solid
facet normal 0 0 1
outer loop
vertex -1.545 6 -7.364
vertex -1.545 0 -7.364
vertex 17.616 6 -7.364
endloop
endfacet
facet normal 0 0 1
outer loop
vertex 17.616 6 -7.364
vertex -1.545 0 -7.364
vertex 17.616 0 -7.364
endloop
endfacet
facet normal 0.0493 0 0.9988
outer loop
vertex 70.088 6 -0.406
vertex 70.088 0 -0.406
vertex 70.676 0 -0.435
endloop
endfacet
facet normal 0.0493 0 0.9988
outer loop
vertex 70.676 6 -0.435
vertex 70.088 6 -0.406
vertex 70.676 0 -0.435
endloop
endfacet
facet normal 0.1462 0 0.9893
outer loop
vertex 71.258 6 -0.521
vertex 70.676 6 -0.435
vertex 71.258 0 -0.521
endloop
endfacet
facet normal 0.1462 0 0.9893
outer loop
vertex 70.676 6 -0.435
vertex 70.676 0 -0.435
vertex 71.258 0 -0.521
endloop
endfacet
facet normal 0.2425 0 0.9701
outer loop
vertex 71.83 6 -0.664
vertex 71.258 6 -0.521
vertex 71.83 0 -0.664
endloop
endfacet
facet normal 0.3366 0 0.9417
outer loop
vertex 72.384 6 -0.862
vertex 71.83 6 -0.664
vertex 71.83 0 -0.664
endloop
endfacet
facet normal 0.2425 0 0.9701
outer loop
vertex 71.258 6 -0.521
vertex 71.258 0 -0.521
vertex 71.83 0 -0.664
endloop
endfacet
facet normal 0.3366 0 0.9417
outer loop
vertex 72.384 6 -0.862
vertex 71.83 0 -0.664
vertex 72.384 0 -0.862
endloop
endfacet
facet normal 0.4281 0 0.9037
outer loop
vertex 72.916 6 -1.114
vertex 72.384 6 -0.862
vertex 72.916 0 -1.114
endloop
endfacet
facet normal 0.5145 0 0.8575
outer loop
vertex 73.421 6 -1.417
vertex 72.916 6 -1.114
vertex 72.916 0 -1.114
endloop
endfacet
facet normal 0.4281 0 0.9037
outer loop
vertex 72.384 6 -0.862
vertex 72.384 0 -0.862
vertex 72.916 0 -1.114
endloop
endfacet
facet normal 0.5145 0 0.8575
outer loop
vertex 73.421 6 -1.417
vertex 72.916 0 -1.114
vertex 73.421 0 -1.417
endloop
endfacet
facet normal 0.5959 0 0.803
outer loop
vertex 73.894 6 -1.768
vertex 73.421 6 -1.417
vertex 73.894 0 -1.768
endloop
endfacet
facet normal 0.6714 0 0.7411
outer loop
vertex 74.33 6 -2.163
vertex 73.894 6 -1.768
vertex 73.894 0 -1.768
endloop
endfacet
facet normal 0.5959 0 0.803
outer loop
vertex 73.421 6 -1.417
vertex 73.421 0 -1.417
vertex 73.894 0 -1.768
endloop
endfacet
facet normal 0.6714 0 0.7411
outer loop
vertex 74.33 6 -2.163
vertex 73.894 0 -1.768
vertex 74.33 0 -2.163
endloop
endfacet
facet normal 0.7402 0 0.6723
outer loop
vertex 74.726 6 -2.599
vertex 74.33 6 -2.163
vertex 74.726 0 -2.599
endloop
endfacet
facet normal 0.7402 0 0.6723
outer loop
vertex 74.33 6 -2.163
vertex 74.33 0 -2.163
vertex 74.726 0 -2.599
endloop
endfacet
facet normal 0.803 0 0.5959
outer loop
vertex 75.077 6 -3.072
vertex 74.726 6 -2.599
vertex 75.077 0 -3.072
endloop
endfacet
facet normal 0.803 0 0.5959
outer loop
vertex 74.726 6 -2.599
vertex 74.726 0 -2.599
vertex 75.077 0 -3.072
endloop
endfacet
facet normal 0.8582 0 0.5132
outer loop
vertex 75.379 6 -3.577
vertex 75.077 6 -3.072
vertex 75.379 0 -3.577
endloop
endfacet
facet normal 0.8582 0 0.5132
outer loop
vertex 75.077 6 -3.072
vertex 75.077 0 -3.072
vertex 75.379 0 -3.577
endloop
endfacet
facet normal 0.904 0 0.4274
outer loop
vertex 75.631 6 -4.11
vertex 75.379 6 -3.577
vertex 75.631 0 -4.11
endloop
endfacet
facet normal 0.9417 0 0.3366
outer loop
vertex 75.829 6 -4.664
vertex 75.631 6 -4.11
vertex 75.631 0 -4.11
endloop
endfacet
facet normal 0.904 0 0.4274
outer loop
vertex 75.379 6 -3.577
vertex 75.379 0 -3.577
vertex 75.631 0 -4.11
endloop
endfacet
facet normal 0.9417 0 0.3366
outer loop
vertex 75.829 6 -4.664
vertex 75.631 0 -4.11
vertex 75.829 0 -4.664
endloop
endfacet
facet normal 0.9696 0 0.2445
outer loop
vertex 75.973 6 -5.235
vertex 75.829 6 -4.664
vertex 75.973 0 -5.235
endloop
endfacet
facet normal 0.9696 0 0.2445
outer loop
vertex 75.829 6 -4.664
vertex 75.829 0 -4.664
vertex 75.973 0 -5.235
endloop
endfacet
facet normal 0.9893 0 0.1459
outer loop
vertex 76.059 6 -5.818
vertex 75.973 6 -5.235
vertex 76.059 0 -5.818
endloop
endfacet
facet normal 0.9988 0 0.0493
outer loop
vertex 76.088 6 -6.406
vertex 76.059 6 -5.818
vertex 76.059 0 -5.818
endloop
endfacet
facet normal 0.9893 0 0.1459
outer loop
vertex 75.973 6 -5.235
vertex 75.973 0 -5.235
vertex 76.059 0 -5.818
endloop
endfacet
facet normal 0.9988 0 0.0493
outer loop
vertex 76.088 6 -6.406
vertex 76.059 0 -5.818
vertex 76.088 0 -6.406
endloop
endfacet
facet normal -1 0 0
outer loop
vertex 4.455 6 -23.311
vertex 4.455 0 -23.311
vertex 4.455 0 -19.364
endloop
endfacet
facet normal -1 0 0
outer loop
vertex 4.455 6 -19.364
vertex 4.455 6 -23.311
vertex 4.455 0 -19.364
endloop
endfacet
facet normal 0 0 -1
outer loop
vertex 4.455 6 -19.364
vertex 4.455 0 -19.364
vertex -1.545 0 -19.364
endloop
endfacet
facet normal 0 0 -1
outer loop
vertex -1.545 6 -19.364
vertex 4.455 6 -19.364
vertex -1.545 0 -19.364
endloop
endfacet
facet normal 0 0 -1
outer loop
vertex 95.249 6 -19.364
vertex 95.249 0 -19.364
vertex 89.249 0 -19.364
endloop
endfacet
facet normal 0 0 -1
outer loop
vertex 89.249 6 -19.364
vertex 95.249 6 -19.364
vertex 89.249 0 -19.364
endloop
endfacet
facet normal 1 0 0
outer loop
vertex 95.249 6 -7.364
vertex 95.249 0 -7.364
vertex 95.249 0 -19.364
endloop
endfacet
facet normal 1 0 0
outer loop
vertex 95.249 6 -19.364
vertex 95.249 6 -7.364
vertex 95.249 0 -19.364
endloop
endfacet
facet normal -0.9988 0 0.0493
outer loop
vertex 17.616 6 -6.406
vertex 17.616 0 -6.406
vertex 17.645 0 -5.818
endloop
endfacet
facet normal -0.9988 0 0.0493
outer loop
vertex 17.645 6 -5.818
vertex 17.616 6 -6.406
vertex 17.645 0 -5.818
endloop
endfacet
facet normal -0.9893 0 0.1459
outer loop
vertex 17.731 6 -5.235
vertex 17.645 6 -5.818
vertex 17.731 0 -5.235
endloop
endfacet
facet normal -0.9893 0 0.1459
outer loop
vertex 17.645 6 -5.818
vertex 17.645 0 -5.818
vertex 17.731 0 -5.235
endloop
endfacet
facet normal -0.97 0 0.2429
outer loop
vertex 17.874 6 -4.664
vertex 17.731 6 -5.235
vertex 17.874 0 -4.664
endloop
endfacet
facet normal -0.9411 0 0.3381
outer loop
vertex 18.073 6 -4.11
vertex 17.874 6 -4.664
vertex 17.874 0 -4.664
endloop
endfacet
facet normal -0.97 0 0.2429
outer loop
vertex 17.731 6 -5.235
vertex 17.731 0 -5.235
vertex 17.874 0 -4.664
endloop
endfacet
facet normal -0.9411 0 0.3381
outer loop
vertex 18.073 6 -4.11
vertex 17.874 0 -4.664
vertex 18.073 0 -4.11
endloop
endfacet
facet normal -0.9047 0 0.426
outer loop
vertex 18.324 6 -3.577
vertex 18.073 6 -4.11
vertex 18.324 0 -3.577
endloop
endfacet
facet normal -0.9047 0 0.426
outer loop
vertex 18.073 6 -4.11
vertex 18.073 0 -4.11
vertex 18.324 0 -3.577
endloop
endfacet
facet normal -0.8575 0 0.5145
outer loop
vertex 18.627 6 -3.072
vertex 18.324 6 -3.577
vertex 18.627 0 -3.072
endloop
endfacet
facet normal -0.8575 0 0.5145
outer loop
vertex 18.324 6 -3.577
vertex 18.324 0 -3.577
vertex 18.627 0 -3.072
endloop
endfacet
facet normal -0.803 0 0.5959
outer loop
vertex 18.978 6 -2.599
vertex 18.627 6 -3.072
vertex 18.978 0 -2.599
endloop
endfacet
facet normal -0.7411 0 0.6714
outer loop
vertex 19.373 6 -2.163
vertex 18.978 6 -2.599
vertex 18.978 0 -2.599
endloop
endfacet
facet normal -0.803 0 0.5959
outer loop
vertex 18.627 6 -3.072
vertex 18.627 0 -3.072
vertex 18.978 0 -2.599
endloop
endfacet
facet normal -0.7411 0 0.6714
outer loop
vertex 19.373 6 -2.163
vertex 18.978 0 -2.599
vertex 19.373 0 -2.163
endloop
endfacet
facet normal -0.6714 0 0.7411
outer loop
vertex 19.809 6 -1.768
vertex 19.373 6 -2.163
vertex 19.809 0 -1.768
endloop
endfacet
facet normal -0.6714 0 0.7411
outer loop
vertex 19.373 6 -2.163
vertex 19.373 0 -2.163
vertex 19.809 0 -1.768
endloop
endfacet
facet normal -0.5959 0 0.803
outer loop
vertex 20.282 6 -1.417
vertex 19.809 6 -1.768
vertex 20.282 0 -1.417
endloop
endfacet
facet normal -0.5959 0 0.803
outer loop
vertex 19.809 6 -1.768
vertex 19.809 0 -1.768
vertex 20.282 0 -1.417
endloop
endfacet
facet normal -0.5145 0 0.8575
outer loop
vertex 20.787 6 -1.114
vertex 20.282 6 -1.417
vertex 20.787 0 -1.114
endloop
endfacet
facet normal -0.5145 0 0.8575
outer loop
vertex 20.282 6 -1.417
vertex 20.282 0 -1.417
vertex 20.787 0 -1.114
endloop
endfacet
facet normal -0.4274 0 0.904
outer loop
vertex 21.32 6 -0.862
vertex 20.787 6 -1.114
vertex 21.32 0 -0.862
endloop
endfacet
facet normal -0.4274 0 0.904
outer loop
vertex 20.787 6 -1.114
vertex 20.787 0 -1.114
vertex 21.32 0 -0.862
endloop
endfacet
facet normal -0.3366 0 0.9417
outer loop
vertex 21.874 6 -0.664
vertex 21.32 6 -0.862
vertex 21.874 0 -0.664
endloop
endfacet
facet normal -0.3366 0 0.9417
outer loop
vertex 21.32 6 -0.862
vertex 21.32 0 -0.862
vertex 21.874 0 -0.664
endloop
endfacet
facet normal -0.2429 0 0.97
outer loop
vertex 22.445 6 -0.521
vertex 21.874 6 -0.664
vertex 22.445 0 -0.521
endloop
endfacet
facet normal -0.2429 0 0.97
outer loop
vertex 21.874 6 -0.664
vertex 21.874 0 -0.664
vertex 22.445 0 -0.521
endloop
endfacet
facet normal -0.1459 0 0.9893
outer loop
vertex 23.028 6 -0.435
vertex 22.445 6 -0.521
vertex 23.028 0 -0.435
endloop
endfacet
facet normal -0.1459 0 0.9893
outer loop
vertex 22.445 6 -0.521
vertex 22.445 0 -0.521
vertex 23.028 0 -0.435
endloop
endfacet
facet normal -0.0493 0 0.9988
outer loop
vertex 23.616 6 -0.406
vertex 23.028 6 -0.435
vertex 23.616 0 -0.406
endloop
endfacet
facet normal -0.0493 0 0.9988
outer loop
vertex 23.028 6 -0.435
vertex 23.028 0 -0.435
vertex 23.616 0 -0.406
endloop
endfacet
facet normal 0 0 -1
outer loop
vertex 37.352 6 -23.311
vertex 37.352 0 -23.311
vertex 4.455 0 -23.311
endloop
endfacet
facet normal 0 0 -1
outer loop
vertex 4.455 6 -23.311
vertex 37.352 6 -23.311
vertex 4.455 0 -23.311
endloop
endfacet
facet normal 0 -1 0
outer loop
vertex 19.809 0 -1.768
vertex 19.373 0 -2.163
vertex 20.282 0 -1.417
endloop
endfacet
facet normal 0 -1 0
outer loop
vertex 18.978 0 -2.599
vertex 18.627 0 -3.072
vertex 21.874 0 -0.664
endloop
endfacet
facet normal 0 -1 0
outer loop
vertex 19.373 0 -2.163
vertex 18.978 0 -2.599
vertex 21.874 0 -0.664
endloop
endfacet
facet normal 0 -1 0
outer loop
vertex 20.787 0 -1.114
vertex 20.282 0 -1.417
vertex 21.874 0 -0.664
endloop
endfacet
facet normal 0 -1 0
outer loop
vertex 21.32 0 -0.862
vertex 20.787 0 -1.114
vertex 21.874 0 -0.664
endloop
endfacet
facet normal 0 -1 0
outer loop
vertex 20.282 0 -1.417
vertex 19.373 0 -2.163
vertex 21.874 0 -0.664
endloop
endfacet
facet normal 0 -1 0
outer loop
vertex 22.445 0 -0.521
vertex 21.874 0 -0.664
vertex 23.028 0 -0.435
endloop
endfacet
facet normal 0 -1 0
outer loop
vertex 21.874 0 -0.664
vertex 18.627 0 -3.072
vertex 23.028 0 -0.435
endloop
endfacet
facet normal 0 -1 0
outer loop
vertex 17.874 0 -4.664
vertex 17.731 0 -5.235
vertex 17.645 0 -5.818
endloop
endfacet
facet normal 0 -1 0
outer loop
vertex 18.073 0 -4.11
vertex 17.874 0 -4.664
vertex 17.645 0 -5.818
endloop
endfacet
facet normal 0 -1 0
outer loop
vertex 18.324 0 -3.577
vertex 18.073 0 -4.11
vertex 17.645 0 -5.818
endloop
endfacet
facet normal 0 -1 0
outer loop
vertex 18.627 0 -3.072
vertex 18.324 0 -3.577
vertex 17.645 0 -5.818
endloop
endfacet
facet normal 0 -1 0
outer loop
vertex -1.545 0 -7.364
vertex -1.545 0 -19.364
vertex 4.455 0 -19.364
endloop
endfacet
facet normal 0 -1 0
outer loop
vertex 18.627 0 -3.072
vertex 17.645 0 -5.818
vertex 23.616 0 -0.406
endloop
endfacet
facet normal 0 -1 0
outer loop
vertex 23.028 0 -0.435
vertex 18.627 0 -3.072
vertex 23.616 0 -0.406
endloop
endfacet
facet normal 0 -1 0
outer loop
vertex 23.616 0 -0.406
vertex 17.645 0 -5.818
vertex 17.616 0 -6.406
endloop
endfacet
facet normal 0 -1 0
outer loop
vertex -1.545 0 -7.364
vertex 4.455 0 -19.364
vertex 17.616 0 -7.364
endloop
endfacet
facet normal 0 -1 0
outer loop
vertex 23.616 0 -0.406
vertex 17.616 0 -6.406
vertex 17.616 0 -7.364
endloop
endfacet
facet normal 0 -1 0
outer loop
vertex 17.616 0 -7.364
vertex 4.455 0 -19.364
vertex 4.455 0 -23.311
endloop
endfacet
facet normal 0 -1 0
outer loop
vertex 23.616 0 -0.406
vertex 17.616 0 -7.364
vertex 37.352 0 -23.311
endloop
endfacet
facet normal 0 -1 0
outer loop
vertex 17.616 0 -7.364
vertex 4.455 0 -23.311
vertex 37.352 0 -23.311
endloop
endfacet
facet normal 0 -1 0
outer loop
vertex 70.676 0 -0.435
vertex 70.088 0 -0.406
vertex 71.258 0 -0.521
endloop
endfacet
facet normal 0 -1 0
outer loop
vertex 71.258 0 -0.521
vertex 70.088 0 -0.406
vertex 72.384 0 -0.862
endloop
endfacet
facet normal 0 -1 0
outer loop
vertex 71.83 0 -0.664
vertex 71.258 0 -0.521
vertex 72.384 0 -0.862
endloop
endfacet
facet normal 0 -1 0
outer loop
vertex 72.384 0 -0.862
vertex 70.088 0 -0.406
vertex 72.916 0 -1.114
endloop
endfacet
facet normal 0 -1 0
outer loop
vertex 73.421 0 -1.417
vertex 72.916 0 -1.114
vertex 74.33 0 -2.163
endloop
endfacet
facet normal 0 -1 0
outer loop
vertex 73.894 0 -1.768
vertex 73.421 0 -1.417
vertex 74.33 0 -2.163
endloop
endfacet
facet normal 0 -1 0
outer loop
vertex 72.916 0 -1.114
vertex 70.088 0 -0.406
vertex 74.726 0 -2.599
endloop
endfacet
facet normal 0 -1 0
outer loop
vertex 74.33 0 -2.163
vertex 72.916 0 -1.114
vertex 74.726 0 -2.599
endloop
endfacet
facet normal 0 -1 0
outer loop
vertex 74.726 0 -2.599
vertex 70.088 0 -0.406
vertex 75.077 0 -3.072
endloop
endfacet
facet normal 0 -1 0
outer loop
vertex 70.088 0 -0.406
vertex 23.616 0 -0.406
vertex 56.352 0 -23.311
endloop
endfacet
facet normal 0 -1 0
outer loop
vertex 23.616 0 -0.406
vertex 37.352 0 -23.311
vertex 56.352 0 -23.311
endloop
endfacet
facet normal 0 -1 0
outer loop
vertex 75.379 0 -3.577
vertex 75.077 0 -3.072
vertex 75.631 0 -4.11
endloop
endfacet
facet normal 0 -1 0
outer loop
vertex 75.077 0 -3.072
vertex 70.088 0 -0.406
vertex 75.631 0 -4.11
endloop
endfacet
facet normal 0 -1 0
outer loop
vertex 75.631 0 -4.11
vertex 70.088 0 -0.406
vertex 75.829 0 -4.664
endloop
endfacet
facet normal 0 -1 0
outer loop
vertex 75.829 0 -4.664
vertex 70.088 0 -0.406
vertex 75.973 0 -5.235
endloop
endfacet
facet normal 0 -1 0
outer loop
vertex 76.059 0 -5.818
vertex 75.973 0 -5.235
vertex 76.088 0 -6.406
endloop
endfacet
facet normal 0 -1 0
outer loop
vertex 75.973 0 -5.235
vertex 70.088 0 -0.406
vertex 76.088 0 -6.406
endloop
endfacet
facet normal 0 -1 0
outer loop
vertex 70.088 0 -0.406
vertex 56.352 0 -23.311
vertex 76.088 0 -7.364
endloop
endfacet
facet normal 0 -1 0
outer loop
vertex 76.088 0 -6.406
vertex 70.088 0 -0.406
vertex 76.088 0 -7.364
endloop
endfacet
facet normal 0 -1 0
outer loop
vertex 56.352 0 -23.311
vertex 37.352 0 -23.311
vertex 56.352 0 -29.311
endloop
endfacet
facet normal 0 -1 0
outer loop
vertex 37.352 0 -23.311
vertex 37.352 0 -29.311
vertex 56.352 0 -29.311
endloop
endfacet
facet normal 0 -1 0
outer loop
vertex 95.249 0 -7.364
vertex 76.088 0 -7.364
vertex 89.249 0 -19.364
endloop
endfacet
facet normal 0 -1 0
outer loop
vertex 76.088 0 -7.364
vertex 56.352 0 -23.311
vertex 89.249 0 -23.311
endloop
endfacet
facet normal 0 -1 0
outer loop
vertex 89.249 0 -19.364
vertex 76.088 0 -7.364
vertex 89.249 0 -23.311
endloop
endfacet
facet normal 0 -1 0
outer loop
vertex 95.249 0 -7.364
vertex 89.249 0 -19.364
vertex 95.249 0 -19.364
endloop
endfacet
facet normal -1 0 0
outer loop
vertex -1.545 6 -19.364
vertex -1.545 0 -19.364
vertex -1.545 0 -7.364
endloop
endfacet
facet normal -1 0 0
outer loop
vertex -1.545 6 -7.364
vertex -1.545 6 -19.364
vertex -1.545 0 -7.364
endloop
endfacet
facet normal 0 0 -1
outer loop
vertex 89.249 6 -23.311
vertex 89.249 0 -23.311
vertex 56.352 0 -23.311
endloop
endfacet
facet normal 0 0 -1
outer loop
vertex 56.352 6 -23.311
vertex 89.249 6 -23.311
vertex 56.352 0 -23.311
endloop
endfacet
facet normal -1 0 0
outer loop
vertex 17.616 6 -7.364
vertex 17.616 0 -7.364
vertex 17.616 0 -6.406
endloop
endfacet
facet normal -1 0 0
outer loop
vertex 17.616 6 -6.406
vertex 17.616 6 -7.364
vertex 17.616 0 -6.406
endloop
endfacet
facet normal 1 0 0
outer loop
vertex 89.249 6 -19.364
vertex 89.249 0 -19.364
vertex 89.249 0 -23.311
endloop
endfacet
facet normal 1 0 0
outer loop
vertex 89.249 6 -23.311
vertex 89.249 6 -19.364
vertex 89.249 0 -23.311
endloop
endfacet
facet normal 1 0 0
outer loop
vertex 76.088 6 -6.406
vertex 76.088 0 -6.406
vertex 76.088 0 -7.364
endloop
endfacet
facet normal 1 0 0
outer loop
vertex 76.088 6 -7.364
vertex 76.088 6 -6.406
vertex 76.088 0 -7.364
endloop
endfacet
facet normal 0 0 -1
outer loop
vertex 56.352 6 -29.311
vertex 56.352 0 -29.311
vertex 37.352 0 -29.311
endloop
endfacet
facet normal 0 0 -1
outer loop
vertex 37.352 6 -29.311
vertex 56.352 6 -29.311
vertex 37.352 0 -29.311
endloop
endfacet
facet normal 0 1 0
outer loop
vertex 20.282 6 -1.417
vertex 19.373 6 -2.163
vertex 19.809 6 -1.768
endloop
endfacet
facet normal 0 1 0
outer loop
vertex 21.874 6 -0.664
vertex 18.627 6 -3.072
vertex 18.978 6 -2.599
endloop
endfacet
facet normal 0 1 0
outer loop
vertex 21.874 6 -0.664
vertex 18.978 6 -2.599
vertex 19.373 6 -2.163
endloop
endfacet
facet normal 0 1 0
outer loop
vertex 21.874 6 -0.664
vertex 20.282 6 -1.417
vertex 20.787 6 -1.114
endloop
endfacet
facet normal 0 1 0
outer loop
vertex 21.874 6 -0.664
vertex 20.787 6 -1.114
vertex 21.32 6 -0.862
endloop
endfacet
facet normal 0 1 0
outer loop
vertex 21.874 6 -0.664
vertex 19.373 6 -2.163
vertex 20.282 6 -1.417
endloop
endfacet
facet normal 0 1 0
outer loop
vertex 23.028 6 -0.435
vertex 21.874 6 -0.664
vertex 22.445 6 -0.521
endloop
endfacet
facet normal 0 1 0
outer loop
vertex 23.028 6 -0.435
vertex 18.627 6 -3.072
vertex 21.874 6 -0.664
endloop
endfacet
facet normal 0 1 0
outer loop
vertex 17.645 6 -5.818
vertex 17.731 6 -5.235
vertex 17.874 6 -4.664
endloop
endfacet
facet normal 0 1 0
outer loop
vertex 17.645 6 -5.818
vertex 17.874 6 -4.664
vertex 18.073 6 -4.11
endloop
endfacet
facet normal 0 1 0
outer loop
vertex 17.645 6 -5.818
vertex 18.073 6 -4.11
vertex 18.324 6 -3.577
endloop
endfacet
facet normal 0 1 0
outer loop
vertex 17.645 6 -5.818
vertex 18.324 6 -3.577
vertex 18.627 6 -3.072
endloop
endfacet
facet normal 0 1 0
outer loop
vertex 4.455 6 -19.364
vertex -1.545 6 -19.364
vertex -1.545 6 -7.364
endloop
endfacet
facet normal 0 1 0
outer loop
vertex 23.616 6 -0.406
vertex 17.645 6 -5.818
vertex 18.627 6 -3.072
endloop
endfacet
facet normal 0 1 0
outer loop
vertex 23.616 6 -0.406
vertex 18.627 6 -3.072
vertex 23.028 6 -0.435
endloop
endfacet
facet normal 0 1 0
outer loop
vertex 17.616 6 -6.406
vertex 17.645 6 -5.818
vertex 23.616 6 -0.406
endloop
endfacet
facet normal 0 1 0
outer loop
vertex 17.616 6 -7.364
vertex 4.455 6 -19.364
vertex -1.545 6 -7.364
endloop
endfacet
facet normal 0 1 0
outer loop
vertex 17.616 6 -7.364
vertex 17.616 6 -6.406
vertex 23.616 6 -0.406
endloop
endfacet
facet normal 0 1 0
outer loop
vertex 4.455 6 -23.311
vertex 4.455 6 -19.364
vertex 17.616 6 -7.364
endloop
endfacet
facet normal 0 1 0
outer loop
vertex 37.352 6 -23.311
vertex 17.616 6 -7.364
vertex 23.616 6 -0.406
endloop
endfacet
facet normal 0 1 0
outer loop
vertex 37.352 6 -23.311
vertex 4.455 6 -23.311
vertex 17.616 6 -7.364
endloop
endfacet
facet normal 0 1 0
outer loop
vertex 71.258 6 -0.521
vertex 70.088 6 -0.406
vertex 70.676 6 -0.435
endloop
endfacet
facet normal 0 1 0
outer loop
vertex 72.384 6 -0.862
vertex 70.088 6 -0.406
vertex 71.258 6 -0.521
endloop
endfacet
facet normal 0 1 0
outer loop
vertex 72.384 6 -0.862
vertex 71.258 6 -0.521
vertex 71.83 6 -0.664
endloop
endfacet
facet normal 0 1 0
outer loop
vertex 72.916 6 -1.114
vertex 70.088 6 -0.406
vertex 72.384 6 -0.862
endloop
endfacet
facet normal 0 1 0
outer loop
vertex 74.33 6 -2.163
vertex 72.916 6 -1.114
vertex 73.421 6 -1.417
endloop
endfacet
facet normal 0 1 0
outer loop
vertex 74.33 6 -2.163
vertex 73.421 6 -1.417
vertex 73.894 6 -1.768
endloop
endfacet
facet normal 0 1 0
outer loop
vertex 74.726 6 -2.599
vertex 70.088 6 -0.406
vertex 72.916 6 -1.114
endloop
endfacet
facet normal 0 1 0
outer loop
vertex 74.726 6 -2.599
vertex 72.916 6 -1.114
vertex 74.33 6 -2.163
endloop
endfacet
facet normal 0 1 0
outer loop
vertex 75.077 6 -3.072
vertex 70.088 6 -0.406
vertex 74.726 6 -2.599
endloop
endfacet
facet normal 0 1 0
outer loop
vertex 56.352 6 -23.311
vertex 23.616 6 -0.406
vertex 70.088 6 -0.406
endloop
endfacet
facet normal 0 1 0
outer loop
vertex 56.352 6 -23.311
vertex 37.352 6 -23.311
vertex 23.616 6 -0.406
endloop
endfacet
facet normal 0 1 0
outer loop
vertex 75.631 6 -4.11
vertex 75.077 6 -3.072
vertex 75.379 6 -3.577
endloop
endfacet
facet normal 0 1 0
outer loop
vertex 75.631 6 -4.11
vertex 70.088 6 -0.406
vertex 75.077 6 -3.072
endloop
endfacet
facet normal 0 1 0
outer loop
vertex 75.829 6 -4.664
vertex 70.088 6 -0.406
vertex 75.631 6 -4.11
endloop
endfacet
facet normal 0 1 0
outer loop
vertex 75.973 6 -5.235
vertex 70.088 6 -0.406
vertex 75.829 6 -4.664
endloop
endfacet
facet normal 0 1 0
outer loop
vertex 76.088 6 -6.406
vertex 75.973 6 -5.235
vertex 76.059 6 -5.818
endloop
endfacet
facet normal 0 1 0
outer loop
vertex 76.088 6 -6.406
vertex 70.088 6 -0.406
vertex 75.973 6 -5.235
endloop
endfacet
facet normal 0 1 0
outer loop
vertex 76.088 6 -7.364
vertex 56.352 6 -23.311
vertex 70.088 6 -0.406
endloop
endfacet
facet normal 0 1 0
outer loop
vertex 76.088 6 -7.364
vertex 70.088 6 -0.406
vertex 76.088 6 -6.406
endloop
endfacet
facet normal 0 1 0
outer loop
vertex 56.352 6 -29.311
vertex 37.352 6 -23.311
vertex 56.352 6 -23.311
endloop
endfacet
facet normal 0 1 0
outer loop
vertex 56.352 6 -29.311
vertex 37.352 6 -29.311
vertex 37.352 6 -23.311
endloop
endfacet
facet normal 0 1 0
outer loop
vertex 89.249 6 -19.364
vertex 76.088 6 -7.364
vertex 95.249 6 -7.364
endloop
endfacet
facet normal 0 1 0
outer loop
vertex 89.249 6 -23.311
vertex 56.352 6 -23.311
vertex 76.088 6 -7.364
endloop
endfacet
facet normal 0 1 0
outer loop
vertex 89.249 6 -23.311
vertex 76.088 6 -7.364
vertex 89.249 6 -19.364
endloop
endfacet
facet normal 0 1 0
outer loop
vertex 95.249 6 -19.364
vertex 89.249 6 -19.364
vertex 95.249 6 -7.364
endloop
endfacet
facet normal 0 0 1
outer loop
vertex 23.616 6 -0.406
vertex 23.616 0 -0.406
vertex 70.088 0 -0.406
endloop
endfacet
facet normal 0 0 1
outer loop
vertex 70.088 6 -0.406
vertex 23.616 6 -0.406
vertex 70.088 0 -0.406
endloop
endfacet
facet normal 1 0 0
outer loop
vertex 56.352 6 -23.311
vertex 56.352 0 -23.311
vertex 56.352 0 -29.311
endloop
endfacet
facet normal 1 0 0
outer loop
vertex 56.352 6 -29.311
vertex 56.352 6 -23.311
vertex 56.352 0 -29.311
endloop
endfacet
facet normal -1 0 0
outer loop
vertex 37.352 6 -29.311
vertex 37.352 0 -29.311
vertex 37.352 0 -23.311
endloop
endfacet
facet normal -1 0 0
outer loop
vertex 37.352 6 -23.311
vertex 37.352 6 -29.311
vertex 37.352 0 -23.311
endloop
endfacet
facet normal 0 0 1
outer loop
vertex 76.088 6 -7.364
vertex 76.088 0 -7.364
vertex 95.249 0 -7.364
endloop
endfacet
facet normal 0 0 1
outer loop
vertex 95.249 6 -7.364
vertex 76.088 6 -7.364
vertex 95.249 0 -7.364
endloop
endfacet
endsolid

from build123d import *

# Parameters (mm, degrees)
BOSS_EXTRUDE1_DEPTH = 6


with BuildPart() as part:
    # Sketch1 → Boss-Extrude1 (new body)
    with BuildSketch(Plane(origin=(0, 0, 0), x_dir=(1, 0, 0), z_dir=(0, 1, 0))):
        with BuildLine():
            Line((40.206859082, 0.405693798), (53.496778433, 0.405693798))
            Line((53.496778433, 0.405693798), (70.087810024, 0.405693798))
            ThreePointArc((70.087810024, 0.405693798), (74.330450711, 2.163053111), (76.087810024, 6.405693798))
            Line((76.087810024, 6.405693798), (76.087810024, 7.364453077))
            Line((76.087810024, 7.364453077), (95.248908352, 7.364453077))
            Line((95.248908352, 7.364453077), (95.248908352, 19.364453077))
            Line((95.248908352, 19.364453077), (89.248908352, 19.364453077))
            Line((89.248908352, 19.364453077), (89.248908352, 23.311113477))
            Line((89.248908352, 23.311113477), (56.351818757, 23.311113477))
            Line((56.351818757, 23.311113477), (56.351818757, 29.311113477))
            Line((56.351818757, 29.311113477), (37.351818757, 29.311113477))
            Line((37.351818757, 29.311113477), (37.351818757, 23.311113477))
            Line((37.351818757, 23.311113477), (4.454729162, 23.311113477))
            Line((4.454729162, 23.311113477), (4.454729162, 19.364453077))
            Line((4.454729162, 19.364453077), (-1.545270838, 19.364453077))
            Line((-1.545270838, 19.364453077), (-1.545270838, 7.364453077))
            Line((-1.545270838, 7.364453077), (17.615827491, 7.364453077))
            Line((17.615827491, 7.364453077), (17.615827491, 6.405693798))
            ThreePointArc((17.615827491, 6.405693798), (19.373186804, 2.163053111), (23.615827491, 0.405693798))
            Line((23.615827491, 0.405693798), (40.206859082, 0.405693798))
        make_face()
    extrude(amount=BOSS_EXTRUDE1_DEPTH)


solid = part.part
